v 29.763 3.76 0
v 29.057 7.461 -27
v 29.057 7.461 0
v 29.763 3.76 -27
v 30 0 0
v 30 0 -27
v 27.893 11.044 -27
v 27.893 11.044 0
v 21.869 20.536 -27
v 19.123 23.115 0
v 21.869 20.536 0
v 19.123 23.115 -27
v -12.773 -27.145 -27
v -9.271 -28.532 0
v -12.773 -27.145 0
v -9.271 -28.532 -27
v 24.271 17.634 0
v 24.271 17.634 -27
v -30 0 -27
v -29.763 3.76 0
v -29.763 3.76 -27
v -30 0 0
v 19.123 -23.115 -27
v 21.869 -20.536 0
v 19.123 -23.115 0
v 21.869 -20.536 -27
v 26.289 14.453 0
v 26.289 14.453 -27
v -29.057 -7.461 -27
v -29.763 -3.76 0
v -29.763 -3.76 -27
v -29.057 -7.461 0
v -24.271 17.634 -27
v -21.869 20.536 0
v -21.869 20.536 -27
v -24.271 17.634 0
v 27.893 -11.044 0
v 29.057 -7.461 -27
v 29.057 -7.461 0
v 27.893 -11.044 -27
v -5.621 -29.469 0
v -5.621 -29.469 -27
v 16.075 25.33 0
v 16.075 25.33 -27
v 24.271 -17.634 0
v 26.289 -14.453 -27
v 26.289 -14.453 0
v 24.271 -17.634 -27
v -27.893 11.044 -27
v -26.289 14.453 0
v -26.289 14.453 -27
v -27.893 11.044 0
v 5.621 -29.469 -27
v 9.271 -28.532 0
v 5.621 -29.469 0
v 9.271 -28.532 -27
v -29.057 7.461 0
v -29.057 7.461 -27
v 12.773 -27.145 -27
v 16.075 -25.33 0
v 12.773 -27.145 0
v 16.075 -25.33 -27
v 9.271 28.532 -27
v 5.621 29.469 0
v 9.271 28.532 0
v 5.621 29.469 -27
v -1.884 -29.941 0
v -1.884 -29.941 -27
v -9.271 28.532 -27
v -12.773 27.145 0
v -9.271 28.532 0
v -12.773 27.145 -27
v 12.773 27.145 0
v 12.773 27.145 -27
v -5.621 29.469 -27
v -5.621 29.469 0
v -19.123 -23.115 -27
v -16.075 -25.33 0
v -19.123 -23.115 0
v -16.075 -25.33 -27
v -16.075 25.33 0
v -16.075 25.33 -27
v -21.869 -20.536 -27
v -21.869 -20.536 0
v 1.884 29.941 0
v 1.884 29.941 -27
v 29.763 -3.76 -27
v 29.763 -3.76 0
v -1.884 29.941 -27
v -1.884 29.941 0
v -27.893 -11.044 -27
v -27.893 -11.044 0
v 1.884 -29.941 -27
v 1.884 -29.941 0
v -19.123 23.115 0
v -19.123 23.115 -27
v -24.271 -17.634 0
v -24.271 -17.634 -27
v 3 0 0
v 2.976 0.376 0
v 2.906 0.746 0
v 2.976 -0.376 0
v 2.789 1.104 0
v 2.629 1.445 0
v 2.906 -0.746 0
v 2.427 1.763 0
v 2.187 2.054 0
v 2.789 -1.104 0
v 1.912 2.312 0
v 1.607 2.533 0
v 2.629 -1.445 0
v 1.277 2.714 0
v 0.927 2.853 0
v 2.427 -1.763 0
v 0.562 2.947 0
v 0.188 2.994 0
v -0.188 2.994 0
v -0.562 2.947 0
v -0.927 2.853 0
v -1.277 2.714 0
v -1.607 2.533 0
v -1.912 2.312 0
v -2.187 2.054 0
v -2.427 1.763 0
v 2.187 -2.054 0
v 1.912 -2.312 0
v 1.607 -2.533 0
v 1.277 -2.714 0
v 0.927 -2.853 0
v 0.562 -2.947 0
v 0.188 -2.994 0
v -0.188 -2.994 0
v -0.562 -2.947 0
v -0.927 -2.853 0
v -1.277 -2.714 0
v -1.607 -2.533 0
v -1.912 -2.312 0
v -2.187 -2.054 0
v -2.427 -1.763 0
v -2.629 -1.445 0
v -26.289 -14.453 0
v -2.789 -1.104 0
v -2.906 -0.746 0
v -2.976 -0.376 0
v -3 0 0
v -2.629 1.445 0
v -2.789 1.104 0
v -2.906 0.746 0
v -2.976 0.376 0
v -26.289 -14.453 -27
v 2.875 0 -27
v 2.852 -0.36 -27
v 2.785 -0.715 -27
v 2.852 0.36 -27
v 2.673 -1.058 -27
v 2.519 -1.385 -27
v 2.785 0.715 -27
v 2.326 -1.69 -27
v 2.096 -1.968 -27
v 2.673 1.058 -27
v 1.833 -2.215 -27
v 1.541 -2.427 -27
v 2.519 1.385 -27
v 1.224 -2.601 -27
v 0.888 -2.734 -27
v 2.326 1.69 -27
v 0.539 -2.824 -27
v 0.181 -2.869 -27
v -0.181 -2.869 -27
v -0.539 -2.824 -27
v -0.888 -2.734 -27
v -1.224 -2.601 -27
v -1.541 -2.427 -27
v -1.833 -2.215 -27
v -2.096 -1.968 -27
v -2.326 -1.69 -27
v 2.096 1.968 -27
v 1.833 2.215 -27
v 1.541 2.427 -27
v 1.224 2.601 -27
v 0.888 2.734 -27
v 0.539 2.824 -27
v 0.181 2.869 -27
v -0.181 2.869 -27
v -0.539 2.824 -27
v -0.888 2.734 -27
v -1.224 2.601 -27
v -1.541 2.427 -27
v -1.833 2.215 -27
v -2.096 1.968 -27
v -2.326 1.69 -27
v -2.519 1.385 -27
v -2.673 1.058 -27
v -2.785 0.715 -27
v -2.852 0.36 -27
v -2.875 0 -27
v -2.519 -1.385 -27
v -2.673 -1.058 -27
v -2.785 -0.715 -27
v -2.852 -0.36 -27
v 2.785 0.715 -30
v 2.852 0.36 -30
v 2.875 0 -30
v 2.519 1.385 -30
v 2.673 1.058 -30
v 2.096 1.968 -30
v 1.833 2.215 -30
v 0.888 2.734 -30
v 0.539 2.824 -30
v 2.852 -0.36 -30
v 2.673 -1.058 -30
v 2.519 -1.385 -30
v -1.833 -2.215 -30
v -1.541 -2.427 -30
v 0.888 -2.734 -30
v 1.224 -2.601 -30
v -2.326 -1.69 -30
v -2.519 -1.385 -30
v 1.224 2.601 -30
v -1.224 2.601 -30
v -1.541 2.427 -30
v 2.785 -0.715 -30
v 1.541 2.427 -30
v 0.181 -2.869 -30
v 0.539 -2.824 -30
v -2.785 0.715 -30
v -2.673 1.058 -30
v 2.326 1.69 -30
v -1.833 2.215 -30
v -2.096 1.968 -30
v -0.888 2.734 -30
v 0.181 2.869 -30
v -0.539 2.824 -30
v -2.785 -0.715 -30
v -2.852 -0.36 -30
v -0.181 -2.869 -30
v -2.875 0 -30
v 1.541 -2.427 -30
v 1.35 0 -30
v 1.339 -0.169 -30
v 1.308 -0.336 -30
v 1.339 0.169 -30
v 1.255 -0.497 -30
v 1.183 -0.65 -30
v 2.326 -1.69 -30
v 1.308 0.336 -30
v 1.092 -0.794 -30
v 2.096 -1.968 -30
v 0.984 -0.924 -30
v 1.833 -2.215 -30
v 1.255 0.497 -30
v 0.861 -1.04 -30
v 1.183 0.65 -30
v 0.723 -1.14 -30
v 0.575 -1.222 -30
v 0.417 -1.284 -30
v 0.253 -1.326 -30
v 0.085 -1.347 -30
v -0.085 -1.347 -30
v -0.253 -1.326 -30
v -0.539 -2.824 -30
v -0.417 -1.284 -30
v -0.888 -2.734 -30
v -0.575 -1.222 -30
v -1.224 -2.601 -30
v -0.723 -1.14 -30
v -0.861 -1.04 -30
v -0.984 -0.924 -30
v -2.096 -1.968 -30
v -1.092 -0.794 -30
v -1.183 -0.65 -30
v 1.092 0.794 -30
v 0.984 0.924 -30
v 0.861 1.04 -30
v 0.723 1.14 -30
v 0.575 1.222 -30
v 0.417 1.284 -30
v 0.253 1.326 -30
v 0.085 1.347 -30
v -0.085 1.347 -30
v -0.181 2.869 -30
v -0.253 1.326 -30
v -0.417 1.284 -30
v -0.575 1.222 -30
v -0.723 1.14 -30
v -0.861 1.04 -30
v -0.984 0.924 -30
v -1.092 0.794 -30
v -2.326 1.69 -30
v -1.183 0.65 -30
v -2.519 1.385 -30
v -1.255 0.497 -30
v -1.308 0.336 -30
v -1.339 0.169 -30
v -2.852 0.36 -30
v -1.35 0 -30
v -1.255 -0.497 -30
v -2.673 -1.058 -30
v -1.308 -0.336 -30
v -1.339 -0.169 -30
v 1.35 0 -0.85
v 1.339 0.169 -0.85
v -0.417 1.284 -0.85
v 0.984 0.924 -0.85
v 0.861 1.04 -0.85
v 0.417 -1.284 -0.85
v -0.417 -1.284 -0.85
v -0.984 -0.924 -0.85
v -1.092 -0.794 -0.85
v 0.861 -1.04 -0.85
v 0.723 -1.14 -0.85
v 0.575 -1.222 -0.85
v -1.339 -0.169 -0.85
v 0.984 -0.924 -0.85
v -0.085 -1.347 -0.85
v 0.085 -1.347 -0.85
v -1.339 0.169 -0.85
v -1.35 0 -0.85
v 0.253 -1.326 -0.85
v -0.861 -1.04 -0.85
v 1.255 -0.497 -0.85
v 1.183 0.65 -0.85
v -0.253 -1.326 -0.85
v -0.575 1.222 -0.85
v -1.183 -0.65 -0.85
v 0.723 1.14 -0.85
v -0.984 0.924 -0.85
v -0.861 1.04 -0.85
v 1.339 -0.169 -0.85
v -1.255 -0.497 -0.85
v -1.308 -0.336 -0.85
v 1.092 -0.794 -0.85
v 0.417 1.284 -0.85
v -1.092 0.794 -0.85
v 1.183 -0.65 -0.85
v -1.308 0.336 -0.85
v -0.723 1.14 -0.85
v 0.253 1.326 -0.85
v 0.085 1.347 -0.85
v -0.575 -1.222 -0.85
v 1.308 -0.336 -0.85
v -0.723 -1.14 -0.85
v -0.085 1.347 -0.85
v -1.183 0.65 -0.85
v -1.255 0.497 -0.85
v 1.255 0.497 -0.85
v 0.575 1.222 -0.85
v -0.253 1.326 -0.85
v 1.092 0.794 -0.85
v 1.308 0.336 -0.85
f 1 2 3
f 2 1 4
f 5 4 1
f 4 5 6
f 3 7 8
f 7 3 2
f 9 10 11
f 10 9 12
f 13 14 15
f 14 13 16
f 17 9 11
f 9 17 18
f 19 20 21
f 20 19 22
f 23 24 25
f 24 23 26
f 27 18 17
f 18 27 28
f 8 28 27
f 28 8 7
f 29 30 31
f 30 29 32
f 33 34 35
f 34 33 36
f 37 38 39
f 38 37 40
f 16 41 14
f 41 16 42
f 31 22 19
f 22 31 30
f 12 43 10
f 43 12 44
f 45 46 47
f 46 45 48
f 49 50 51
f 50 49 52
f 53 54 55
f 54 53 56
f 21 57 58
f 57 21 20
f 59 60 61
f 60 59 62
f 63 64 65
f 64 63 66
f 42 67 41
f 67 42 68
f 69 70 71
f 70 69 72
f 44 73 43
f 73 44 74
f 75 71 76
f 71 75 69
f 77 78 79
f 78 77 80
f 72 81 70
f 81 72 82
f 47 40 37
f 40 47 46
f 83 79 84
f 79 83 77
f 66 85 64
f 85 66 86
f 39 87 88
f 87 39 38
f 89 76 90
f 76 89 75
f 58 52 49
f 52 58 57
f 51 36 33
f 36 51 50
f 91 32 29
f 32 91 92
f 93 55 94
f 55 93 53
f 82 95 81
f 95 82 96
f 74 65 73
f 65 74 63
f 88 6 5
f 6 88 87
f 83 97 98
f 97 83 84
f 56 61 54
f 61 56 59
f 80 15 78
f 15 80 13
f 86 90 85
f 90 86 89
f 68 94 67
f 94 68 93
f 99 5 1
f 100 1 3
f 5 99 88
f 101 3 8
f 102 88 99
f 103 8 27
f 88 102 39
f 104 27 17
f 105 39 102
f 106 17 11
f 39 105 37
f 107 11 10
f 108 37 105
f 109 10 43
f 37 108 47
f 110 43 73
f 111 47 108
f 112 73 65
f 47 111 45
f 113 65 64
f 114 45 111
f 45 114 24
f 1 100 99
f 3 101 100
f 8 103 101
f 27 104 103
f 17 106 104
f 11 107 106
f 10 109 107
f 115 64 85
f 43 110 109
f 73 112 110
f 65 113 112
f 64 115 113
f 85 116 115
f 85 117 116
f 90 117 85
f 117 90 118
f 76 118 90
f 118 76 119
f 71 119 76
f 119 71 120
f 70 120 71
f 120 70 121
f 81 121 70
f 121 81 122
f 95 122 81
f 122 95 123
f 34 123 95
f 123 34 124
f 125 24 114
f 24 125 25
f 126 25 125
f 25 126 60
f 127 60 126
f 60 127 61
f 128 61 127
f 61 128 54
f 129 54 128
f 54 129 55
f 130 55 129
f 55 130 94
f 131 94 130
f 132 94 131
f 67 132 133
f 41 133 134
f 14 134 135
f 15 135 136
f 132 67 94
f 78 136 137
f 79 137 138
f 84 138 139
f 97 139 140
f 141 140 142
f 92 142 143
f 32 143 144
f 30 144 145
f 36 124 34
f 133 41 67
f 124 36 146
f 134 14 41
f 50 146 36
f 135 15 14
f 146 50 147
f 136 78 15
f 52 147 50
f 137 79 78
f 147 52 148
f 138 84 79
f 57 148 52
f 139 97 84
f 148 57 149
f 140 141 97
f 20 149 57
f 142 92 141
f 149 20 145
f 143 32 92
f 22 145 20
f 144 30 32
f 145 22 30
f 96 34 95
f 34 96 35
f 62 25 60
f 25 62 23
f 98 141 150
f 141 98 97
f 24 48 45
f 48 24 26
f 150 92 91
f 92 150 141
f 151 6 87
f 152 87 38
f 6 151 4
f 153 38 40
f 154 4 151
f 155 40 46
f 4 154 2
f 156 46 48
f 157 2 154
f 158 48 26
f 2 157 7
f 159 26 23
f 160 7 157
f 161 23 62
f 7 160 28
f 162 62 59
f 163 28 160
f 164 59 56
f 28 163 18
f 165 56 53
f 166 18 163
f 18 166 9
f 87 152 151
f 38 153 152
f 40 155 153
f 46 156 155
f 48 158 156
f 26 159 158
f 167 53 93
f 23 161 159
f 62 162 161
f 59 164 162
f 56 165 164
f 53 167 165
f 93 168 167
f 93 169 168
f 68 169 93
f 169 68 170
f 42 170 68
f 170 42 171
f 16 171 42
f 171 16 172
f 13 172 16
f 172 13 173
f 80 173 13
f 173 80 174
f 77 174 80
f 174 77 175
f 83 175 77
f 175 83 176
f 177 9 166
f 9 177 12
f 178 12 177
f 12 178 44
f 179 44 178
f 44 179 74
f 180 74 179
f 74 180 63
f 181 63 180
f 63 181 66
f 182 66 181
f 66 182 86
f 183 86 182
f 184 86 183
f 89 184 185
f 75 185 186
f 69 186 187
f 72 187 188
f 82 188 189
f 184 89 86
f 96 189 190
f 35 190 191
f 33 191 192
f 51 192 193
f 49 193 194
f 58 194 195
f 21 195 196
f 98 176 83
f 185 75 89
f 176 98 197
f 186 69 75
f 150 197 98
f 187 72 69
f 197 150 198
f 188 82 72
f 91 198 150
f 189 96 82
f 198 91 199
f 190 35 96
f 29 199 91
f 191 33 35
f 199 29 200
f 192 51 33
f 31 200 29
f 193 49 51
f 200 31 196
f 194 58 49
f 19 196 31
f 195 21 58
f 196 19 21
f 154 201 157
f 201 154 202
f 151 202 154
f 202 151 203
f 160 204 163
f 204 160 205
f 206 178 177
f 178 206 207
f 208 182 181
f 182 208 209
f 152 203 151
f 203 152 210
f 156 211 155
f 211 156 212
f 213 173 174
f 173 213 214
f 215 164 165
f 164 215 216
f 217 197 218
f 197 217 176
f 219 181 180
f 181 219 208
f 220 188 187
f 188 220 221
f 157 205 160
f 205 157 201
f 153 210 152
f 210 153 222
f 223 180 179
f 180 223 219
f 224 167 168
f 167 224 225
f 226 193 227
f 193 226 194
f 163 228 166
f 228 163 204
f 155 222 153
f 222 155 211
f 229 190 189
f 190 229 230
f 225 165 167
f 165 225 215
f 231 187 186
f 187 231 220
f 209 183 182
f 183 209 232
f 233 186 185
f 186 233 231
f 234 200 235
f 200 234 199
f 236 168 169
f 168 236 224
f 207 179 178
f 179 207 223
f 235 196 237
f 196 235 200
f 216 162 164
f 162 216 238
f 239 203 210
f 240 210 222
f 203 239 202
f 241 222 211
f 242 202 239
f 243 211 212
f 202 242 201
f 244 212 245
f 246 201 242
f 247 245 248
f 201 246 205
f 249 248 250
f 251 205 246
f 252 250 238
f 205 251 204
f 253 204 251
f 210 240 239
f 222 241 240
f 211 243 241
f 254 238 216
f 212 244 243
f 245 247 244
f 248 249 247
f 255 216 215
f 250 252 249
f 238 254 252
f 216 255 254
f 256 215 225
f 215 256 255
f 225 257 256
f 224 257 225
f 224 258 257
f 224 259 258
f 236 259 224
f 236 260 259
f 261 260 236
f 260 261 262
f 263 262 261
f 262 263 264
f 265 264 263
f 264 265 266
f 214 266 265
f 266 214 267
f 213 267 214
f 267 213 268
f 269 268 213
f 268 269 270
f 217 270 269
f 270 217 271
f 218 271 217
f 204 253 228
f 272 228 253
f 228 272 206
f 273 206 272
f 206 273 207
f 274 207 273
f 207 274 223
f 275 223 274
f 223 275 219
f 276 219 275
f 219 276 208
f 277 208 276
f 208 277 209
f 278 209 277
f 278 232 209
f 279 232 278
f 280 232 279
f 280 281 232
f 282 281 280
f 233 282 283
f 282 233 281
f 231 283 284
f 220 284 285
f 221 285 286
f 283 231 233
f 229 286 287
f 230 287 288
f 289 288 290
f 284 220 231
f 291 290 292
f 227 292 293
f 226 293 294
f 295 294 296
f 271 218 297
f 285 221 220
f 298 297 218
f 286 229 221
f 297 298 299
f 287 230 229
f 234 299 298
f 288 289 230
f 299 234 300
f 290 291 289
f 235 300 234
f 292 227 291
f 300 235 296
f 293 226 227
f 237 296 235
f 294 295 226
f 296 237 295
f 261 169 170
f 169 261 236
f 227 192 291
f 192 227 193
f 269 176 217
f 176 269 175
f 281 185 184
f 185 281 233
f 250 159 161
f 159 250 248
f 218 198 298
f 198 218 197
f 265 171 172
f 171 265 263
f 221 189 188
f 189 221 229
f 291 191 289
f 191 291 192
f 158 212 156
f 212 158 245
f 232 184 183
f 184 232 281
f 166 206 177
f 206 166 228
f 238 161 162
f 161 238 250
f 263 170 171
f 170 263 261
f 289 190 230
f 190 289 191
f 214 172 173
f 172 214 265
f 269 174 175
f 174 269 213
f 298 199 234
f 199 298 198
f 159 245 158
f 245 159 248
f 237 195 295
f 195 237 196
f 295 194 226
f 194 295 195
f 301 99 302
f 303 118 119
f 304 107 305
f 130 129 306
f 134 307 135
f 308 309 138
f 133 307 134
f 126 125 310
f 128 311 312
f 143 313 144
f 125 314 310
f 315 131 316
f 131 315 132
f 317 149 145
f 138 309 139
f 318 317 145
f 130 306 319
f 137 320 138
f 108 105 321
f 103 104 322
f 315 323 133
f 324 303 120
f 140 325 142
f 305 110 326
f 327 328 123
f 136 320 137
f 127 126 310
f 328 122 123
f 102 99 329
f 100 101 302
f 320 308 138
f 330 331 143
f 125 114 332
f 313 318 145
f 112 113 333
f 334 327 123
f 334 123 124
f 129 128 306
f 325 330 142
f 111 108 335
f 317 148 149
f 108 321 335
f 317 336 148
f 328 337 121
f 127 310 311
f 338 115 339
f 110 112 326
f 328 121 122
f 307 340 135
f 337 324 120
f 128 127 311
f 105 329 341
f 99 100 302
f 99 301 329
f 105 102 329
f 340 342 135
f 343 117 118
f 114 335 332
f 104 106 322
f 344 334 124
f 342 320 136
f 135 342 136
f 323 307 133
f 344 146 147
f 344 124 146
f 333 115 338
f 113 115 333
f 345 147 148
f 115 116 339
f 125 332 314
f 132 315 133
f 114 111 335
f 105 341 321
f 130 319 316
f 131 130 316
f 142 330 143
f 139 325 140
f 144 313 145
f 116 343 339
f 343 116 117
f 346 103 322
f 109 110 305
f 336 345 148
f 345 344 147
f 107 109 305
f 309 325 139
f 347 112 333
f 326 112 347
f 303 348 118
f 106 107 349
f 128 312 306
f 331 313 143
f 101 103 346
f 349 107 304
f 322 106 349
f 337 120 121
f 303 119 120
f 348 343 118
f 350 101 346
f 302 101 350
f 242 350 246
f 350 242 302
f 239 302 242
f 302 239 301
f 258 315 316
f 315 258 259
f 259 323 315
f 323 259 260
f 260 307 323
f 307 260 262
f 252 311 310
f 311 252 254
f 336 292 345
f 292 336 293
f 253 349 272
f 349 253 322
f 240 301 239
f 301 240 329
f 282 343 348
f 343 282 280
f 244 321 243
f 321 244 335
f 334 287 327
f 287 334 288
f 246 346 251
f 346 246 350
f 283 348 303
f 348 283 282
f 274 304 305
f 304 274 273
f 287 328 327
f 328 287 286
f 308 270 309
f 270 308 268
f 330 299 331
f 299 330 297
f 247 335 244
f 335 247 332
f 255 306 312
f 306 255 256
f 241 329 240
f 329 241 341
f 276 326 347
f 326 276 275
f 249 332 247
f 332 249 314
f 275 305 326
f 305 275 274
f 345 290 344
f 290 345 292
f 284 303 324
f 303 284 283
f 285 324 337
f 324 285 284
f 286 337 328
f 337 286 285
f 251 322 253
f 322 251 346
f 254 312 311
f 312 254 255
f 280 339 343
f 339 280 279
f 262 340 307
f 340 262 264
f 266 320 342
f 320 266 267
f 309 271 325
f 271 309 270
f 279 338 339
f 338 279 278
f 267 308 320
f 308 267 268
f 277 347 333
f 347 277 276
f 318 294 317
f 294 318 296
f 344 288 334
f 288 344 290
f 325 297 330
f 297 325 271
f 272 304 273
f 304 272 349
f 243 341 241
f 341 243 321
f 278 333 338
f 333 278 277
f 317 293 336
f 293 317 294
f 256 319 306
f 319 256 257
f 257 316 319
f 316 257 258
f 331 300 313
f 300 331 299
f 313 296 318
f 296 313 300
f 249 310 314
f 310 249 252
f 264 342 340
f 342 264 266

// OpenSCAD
$fn = 50;

difference() {
	union() {
		translate(v = [0, 0, -27.0]) {
			cylinder(h = 27, r = 30.0);
		}
		#translate(v = [0, 0, -30.0]) {
			cylinder(h = 30, r = 2.875);
		}
	}
	union() {
		translate(v = [0, 0, 0]) {
			rotate(a = [0, 0, 0]) {
				difference() {
					union() {
						translate(v = [0, 0, -30.0]) {
							cylinder(h = 30, r = 1.0);
						}
						translate(v = [0, 0, -0.85]) {
							cylinder(h = 0.85, r1 = 1.35, r2 = 3.0);
						}
						translate(v = [0, 0, -30.0]) {
							cylinder(h = 30, r = 1.35);
						}
						translate(v = [0, 0, -30.0]) {
							cylinder(h = 30, r = 1.0);
						}
					}
					union();
				}
			}
		}
	}
}
